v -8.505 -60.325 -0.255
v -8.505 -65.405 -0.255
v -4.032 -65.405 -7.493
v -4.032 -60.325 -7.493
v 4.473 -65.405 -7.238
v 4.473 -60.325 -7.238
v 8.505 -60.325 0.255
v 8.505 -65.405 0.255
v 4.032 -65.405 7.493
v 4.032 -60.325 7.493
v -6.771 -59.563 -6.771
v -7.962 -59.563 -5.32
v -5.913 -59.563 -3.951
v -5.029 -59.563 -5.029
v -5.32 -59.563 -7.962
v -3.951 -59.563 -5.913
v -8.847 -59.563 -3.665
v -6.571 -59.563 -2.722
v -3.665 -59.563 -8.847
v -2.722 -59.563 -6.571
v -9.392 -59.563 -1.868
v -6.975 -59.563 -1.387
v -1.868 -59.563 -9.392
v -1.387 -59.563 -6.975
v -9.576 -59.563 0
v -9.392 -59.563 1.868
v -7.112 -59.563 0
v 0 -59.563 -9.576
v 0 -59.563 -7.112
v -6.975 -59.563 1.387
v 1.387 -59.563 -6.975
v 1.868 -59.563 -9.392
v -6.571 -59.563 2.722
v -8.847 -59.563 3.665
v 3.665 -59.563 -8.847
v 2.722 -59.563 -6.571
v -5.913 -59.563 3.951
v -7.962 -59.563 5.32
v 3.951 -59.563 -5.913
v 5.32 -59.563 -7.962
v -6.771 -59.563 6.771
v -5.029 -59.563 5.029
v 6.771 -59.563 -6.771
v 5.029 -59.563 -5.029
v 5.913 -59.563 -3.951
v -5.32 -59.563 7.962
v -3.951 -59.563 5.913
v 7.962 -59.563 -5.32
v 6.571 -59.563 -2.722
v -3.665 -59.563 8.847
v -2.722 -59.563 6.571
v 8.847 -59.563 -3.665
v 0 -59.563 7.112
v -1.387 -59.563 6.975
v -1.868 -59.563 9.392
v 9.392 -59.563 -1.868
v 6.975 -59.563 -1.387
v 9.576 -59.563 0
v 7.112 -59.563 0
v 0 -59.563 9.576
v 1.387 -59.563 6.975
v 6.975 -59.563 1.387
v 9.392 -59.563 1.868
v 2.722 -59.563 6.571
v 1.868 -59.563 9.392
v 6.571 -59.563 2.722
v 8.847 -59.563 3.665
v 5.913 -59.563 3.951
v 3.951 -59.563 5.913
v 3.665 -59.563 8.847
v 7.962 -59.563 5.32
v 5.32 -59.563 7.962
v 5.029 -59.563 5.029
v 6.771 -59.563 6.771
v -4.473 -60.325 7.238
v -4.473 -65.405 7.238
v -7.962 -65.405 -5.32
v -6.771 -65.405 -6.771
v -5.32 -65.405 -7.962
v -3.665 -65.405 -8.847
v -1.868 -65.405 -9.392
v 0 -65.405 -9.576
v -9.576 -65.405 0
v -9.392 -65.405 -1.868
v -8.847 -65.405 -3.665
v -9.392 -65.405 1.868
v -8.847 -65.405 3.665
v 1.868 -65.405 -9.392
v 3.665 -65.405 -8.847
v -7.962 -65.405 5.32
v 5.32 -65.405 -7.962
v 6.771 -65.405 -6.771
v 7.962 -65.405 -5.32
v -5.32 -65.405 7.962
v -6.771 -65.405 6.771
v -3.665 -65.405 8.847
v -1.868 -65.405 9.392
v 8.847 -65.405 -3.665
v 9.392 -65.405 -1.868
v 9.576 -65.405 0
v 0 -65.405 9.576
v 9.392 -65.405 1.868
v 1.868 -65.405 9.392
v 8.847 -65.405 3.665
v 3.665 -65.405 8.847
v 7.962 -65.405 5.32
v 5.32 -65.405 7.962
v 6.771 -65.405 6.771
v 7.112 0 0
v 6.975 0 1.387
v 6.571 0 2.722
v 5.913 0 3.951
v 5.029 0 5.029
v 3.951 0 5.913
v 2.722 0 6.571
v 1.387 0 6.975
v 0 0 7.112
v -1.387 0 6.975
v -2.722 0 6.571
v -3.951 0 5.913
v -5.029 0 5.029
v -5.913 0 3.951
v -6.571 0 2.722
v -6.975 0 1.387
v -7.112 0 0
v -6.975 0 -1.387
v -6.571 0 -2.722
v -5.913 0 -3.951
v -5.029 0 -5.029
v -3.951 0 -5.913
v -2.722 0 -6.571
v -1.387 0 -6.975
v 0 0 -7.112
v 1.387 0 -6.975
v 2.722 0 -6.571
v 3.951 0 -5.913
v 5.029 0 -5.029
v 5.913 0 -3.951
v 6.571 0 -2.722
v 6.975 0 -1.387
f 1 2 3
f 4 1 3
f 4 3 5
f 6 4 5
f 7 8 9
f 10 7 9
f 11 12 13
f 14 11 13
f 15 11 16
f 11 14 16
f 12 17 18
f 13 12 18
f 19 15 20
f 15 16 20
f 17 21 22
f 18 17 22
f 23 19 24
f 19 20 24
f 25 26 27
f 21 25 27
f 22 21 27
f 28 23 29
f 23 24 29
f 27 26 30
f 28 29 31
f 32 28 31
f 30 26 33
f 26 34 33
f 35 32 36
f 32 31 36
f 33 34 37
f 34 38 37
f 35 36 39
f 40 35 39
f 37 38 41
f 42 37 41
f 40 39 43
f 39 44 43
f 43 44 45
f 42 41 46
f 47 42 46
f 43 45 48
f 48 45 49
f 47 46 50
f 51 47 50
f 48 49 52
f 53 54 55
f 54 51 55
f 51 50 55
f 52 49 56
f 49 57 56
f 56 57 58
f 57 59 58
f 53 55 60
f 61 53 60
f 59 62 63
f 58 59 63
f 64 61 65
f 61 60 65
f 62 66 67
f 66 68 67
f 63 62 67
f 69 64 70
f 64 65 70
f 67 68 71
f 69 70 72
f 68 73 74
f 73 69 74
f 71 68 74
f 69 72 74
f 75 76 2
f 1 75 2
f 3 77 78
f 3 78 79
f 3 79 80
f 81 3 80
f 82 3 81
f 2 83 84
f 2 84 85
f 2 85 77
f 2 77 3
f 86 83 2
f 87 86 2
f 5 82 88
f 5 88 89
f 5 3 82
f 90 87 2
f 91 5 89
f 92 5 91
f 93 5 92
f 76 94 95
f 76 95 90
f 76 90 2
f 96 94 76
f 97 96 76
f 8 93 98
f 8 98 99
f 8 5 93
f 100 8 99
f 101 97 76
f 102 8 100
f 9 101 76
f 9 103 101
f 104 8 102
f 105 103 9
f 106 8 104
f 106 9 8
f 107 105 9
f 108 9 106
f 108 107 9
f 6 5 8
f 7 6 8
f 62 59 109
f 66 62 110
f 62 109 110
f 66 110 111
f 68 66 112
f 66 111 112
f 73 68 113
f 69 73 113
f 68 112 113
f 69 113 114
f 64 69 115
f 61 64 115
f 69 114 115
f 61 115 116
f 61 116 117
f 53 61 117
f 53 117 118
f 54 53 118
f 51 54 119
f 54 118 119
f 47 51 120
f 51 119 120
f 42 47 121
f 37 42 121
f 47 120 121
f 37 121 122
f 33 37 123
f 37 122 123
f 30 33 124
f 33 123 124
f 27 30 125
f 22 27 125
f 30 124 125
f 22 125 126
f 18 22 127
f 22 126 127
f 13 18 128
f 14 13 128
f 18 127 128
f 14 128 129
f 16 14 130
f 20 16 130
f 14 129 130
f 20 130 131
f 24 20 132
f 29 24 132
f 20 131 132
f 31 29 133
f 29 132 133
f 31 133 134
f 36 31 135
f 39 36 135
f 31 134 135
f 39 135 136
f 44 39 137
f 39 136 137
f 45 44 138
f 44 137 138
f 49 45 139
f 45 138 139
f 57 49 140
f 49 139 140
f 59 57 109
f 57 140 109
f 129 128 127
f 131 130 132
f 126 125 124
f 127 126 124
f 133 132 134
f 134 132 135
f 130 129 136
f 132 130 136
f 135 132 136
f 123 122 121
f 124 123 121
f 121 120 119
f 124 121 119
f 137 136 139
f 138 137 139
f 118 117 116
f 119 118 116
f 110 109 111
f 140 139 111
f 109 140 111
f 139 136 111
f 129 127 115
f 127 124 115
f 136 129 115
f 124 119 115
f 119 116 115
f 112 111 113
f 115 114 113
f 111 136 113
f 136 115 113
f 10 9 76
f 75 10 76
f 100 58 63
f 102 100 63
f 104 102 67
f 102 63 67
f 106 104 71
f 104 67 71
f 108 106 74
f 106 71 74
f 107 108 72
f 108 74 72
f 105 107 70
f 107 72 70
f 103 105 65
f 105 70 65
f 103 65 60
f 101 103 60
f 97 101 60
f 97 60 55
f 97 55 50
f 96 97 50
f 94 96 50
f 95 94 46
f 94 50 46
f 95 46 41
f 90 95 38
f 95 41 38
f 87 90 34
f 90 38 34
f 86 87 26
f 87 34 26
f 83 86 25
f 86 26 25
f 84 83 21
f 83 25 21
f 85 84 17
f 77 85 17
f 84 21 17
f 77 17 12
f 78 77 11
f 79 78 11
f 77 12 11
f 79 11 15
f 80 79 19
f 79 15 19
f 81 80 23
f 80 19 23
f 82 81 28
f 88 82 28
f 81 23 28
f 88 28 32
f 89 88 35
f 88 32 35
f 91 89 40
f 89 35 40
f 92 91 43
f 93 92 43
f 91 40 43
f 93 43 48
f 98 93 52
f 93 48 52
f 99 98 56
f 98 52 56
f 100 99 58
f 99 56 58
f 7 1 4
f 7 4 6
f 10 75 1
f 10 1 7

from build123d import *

# Parameters (mm, degrees)
F0_R     = 7.112
F1_DEPTH = 59.563
F2_R     = 9.5758
F2_R_2   = 7.112
F3_DEPTH = 5.842
F5_DEPTH = 5.08


with BuildPart() as f1:
    # F0 (on Front) → F1 (new body)
    with BuildSketch(Plane.XZ):
        Circle(F0_R)
    extrude(amount=F1_DEPTH)

    # F2 (on face) → F3 (join)
    with BuildSketch(Plane.XZ.offset(59.563)):
        Circle(F2_R)
        Circle(F2_R_2, mode=Mode.SUBTRACT)
        Circle(F2_R_2)
    extrude(amount=F3_DEPTH)

    # F4 (on face) → F5 (cut)
    with BuildSketch(Plane.XZ.offset(65.405)):
        Polygon((8.5051758644, 0.2550774705), (4.0316843628, 7.4932370975), (-4.4734915016, 7.238159627), (-8.5051758644, -0.2550774705), (-4.0316843628, -7.4932370975), (4.4734915016, -7.238159627), align=None)
    extrude(amount=-F5_DEPTH, mode=Mode.SUBTRACT)


solid = f1.part
